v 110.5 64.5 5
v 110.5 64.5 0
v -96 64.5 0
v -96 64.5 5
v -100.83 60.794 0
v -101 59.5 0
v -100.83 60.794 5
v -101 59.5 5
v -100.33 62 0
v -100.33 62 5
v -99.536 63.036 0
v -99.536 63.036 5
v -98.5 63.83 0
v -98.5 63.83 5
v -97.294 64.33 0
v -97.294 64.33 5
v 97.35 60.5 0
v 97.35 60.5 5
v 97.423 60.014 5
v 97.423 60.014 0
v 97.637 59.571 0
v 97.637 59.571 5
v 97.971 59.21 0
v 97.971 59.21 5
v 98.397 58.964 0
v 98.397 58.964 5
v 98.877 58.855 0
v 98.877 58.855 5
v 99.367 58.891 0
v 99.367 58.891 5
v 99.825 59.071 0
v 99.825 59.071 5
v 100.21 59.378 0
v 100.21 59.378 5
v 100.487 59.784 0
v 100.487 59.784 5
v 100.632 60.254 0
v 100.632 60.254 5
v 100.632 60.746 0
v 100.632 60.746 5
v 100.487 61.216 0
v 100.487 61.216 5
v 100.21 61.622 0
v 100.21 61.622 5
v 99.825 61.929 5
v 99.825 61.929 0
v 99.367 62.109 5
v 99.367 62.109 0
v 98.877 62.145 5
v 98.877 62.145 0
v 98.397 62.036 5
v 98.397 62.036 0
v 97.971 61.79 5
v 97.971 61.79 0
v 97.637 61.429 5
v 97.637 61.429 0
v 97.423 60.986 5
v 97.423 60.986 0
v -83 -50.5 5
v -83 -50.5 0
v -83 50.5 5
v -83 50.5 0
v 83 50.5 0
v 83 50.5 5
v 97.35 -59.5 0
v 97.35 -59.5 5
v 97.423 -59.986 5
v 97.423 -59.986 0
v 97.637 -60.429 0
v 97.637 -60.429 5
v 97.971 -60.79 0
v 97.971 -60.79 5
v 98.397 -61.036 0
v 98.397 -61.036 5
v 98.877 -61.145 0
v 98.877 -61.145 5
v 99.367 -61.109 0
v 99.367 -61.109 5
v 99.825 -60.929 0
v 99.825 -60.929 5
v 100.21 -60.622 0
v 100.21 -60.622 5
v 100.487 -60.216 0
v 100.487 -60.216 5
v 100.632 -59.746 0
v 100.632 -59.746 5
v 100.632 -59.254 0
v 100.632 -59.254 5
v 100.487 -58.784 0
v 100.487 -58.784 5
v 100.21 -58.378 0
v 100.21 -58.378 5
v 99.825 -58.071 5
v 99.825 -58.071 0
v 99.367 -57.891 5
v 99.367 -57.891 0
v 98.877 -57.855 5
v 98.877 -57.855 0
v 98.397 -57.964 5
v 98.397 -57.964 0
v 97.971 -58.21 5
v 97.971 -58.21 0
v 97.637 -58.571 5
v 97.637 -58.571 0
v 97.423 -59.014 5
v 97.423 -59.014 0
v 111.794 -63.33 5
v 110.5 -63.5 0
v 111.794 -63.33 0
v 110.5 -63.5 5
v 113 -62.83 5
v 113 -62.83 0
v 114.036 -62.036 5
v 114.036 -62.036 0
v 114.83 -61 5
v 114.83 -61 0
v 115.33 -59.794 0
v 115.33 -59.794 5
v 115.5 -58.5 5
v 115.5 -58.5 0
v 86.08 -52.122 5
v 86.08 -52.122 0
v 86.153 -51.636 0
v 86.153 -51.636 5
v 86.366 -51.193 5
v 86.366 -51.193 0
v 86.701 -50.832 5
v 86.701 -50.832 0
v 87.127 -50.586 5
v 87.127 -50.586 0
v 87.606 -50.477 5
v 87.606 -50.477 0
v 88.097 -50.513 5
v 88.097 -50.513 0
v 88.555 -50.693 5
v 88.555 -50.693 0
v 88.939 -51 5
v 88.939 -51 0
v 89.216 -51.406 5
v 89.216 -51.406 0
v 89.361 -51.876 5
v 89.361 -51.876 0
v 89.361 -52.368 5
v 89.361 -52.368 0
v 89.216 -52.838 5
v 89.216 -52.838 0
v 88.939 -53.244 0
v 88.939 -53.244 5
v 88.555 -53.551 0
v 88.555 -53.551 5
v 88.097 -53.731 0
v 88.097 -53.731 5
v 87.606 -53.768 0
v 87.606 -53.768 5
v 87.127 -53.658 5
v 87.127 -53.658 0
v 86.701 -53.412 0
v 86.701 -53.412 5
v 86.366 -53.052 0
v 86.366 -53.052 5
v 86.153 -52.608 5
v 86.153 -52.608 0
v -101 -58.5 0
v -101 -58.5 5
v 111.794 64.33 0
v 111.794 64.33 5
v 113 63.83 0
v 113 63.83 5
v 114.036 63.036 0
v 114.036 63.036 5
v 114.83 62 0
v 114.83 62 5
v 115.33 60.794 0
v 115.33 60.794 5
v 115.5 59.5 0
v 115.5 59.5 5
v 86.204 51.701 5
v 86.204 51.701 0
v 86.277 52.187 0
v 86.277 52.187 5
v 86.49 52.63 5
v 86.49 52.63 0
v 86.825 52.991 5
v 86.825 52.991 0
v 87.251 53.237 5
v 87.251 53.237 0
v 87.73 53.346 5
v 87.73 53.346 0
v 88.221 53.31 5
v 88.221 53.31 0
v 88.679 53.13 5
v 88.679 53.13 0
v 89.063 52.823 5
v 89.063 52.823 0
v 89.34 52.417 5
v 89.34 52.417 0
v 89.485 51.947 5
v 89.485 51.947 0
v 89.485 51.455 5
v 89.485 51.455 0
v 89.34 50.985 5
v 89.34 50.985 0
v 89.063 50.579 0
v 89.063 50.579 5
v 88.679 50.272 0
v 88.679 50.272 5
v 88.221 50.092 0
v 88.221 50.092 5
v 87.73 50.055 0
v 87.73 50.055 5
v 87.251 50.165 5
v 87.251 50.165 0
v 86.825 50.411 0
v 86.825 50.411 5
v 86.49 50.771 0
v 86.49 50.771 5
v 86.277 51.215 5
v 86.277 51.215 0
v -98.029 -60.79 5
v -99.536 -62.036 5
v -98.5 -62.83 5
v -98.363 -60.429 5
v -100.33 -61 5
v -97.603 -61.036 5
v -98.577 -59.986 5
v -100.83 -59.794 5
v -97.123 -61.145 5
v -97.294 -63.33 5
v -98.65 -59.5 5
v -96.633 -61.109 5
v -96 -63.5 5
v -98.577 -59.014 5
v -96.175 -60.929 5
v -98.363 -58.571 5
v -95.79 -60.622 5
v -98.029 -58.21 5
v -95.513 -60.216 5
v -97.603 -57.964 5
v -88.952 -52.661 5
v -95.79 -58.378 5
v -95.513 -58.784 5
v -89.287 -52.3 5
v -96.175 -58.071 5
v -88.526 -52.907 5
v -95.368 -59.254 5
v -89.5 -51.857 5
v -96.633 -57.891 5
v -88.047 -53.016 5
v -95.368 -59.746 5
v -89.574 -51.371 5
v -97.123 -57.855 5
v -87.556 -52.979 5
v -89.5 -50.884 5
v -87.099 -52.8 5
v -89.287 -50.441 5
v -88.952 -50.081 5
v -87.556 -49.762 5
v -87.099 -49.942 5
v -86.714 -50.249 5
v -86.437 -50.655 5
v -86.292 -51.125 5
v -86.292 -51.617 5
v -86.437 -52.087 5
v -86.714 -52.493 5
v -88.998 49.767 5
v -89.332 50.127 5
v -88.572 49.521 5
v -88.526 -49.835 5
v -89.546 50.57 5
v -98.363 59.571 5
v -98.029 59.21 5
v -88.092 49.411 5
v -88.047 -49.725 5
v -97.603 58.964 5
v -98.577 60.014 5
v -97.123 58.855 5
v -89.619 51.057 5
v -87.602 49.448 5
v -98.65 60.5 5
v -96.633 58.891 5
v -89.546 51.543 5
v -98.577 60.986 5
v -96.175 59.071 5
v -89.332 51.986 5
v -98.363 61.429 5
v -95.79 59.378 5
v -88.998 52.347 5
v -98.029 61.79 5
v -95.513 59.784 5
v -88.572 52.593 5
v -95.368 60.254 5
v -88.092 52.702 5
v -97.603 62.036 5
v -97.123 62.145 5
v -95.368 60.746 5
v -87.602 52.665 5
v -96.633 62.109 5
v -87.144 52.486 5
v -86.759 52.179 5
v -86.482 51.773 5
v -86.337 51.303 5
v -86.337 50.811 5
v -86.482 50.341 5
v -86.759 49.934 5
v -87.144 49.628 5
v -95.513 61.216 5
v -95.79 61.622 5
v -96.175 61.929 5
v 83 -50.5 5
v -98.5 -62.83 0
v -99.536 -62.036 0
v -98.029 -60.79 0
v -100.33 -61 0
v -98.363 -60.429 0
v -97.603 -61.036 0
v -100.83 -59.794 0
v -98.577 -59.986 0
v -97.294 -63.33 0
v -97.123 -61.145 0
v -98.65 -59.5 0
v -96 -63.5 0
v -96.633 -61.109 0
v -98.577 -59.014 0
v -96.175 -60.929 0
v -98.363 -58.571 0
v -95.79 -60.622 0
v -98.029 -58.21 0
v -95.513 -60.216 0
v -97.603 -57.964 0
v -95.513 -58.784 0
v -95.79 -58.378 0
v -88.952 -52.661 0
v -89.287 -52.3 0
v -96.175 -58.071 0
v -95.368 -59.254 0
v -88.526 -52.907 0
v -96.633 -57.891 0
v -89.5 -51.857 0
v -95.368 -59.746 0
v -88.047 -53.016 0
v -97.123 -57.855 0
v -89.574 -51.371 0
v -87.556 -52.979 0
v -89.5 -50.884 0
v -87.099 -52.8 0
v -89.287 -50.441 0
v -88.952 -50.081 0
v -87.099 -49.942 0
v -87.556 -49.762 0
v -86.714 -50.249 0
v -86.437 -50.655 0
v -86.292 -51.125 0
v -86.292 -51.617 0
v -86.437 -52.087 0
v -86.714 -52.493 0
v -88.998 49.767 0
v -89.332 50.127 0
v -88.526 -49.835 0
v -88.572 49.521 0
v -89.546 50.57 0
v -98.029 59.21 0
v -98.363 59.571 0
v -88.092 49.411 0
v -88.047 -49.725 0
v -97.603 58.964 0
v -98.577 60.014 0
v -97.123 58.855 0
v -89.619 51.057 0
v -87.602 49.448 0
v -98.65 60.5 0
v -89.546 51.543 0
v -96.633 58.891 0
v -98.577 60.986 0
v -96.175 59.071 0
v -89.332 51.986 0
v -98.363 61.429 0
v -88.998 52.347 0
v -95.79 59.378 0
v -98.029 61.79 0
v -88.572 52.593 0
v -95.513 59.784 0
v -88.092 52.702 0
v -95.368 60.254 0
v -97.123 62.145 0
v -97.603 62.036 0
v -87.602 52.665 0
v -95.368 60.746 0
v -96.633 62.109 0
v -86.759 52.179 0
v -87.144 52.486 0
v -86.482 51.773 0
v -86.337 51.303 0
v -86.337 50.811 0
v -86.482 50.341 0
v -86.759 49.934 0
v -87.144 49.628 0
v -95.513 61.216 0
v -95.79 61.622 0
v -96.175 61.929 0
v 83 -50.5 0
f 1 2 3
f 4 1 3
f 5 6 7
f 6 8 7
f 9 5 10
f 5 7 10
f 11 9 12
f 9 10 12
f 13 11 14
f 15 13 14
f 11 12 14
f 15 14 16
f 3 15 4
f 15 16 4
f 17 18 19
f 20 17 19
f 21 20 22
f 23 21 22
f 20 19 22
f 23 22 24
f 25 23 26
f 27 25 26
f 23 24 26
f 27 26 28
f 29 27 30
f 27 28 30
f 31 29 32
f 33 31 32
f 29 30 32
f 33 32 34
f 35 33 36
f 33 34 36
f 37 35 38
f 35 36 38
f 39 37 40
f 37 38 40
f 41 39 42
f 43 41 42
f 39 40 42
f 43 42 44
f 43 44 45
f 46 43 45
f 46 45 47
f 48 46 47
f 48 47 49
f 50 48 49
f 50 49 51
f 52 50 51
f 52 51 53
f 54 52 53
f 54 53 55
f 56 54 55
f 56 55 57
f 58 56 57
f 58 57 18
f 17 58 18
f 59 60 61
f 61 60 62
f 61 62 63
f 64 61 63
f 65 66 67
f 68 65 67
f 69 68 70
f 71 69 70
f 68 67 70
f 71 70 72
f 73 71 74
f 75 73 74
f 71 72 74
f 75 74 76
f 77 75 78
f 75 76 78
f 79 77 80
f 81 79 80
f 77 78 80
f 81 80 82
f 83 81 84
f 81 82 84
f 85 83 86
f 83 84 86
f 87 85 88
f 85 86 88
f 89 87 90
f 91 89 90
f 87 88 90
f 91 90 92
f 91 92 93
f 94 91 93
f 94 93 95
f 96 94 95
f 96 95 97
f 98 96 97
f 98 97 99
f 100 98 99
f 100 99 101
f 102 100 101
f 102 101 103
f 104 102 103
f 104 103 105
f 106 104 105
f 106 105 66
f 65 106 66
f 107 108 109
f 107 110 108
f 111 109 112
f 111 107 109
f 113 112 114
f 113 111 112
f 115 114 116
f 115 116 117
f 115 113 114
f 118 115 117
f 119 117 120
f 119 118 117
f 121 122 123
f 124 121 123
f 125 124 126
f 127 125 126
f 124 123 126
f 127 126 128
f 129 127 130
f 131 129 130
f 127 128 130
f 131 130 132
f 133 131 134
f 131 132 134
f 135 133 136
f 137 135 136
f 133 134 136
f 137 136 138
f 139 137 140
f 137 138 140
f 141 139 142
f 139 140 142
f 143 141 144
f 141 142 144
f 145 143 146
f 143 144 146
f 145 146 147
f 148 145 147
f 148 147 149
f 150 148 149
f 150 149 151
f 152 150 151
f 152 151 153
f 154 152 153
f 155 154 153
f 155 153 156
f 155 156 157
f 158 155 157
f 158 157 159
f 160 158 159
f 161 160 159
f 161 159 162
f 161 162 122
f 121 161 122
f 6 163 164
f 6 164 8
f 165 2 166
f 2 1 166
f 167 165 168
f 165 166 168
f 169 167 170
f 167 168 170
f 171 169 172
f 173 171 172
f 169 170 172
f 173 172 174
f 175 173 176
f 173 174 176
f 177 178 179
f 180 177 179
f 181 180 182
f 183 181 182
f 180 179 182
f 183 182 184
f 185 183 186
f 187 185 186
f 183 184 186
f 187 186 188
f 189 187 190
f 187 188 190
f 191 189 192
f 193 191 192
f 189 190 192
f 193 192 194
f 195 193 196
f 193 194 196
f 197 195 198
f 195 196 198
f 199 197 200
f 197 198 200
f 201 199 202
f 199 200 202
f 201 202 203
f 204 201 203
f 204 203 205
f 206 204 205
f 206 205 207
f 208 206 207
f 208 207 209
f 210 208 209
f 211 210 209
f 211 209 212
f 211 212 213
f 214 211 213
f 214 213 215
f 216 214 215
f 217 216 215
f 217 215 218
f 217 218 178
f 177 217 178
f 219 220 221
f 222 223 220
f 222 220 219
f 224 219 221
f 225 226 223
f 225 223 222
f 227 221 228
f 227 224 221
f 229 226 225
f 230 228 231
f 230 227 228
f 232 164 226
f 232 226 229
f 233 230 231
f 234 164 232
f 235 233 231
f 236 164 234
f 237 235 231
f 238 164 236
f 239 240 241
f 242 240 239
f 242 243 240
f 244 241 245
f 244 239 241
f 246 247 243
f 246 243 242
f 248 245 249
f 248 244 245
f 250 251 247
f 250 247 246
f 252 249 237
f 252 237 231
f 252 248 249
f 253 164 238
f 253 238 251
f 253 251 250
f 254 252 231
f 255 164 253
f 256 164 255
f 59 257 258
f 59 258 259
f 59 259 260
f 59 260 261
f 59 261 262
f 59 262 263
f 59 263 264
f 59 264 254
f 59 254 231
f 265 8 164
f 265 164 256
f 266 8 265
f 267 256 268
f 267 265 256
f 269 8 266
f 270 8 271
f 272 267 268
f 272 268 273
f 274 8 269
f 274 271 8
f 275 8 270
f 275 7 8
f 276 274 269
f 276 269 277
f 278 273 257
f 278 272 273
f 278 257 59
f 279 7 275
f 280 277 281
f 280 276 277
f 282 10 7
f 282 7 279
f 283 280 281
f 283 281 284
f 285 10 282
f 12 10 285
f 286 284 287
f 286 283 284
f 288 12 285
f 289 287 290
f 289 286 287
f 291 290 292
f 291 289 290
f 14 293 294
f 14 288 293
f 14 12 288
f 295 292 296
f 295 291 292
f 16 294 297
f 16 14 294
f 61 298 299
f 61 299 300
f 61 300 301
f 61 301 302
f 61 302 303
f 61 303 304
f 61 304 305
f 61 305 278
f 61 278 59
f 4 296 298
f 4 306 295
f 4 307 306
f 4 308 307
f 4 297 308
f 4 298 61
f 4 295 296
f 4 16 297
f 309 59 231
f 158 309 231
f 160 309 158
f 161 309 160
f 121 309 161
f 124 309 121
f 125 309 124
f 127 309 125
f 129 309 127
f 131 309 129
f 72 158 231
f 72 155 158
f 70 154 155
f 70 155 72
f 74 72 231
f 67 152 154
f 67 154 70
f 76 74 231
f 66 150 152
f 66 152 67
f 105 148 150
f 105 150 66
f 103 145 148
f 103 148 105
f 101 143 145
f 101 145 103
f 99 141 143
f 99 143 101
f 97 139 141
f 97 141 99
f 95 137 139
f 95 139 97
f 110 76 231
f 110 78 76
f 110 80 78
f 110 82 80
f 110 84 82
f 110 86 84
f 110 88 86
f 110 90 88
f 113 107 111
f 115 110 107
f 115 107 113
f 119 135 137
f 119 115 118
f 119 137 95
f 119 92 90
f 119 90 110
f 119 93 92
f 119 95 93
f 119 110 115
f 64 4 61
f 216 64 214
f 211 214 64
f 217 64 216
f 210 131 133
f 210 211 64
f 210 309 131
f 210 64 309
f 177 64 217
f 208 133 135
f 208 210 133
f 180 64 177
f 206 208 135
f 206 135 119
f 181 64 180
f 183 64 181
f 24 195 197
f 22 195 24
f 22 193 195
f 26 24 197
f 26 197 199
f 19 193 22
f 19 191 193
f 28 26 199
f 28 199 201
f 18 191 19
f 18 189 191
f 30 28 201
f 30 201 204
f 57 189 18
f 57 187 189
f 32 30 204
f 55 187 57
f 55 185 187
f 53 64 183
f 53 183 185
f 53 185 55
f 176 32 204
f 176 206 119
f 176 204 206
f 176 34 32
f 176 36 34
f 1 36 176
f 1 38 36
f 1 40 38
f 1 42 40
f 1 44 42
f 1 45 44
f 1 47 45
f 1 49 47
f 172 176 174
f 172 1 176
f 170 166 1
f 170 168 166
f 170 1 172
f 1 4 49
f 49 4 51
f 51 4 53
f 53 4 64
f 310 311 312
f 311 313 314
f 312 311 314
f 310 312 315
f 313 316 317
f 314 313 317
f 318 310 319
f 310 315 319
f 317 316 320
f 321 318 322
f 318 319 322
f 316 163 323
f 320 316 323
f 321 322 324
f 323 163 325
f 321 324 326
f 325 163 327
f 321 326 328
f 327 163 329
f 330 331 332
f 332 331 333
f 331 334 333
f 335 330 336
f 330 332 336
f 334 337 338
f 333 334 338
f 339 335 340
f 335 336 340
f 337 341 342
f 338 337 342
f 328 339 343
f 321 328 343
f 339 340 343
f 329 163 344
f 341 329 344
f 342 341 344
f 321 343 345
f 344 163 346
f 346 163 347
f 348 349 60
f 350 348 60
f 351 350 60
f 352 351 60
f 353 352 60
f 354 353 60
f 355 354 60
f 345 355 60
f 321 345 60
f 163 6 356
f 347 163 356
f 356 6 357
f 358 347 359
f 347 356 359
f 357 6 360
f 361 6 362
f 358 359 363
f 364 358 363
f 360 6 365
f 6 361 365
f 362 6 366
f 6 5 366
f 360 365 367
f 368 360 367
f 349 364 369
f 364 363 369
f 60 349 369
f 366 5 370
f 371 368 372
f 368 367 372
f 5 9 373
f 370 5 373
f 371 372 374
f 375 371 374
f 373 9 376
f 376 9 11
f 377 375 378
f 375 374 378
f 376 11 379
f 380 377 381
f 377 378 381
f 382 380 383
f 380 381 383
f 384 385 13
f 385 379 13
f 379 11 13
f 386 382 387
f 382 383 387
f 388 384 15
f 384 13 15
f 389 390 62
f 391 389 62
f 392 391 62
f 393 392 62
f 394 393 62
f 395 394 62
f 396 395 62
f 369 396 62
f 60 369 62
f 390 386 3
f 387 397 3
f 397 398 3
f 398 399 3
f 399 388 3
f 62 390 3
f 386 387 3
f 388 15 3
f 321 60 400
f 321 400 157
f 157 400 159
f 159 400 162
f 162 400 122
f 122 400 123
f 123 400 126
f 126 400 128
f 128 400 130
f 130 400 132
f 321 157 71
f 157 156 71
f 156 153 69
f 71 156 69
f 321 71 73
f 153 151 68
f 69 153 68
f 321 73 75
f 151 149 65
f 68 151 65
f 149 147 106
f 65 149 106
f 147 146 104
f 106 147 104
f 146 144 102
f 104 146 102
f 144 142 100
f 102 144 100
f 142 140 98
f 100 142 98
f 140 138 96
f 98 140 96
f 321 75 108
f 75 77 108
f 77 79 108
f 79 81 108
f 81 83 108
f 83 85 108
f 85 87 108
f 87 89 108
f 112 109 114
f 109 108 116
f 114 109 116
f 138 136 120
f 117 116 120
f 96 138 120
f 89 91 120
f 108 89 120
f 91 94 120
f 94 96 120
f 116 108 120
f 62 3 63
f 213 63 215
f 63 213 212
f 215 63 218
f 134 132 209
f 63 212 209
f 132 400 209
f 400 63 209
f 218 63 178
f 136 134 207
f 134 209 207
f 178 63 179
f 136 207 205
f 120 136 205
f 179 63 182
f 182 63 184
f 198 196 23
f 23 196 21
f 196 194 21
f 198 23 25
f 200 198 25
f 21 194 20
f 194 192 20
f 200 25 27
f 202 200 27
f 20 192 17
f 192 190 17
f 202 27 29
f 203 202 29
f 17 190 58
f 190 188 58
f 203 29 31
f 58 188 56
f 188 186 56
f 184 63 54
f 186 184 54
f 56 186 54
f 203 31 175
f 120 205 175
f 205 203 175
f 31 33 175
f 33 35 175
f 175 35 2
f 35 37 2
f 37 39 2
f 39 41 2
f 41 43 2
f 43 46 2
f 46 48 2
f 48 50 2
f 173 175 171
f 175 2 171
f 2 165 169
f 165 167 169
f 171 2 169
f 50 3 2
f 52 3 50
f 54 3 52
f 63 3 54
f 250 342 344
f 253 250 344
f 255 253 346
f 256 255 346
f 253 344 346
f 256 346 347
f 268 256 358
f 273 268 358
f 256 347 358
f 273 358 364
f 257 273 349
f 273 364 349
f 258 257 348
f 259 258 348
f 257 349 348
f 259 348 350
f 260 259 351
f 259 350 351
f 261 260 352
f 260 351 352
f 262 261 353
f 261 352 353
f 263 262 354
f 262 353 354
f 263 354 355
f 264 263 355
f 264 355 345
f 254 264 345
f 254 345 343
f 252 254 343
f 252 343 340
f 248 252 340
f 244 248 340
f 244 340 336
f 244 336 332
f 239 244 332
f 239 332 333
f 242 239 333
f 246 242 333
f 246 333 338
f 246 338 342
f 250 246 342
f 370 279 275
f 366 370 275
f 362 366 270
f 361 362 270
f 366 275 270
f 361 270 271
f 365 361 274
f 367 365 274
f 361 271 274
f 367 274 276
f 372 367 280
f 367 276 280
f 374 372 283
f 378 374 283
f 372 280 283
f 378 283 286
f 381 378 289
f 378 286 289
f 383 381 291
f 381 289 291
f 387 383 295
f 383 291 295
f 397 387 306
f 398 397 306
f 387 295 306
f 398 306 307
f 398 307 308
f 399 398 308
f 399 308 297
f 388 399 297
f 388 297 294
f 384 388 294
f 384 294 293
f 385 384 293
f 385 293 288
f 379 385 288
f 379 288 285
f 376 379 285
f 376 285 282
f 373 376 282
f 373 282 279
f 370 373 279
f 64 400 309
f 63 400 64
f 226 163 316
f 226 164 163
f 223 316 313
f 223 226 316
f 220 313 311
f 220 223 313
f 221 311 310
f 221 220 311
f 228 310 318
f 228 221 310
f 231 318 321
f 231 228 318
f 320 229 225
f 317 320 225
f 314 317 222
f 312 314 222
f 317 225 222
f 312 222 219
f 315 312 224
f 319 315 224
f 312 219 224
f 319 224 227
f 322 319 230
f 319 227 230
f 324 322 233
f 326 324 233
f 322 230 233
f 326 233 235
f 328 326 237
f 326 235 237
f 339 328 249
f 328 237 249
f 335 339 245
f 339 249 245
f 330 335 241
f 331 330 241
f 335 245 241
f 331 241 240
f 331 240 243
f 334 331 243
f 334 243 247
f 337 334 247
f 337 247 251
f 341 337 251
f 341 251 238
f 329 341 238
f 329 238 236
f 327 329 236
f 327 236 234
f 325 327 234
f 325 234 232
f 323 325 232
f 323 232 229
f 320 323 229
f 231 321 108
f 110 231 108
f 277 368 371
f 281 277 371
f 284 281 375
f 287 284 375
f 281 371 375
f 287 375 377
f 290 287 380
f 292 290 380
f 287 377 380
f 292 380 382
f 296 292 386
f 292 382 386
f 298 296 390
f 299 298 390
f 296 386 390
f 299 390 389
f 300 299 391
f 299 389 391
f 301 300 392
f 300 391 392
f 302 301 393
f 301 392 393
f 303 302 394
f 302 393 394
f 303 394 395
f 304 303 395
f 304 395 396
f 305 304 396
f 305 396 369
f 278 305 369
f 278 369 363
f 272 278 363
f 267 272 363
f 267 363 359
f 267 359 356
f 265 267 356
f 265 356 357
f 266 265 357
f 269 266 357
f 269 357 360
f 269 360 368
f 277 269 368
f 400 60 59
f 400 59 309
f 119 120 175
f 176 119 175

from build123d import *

# Parameters (mm, degrees)
F0_W     = 204
F0_H     = 128
F0_W_2   = 166
F0_H_2   = 101
F0_W_3   = 12.5
F1_DEPTH = 5
F2_D     = 3.3
F4_D     = 3.3
F5_R     = 5


with BuildPart() as f1:
    # F0 (on Top) → F1 (new body)
    with BuildSketch(Plane.XY):
        with Locations((1, 0.5)):
            Rectangle(F0_W, F0_H)
        Rectangle(F0_W_2, F0_H_2, mode=Mode.SUBTRACT)
        with Locations((109.25, 0.5)):
            Rectangle(F0_W_3, F0_H)
    extrude(amount=F1_DEPTH)

    # F2 (through all)
    with Locations(Plane(origin=(0, 0, 0), x_dir=(1, 0, 0), z_dir=(0, 0, -1))):
        with Locations((-97, -60.5), (99, -60.5), (99, 59.5), (-97, 59.5)):
            Hole(F2_D / 2)

    # F4 (through all)
    with Locations(Plane.XY.offset(5)):
        with Locations((-87.9689130953, 51.0566890079), (87.853647545, 51.7008769748), (87.7295576794, -52.1221233483), (-87.9235801444, -51.3708378505)):
            Hole(F4_D / 2)

    # F5
    f5_edges = [f1.edges().sort_by_distance(p)[0] for p in [
        (-101, 64.5, 2.5),
        (115.5, 64.5, 2.5),
        (115.5, -63.5, 2.5),
        (-101, -63.5, 2.5),
    ]]
    fillet(f5_edges, radius=F5_R)


solid = f1.part
